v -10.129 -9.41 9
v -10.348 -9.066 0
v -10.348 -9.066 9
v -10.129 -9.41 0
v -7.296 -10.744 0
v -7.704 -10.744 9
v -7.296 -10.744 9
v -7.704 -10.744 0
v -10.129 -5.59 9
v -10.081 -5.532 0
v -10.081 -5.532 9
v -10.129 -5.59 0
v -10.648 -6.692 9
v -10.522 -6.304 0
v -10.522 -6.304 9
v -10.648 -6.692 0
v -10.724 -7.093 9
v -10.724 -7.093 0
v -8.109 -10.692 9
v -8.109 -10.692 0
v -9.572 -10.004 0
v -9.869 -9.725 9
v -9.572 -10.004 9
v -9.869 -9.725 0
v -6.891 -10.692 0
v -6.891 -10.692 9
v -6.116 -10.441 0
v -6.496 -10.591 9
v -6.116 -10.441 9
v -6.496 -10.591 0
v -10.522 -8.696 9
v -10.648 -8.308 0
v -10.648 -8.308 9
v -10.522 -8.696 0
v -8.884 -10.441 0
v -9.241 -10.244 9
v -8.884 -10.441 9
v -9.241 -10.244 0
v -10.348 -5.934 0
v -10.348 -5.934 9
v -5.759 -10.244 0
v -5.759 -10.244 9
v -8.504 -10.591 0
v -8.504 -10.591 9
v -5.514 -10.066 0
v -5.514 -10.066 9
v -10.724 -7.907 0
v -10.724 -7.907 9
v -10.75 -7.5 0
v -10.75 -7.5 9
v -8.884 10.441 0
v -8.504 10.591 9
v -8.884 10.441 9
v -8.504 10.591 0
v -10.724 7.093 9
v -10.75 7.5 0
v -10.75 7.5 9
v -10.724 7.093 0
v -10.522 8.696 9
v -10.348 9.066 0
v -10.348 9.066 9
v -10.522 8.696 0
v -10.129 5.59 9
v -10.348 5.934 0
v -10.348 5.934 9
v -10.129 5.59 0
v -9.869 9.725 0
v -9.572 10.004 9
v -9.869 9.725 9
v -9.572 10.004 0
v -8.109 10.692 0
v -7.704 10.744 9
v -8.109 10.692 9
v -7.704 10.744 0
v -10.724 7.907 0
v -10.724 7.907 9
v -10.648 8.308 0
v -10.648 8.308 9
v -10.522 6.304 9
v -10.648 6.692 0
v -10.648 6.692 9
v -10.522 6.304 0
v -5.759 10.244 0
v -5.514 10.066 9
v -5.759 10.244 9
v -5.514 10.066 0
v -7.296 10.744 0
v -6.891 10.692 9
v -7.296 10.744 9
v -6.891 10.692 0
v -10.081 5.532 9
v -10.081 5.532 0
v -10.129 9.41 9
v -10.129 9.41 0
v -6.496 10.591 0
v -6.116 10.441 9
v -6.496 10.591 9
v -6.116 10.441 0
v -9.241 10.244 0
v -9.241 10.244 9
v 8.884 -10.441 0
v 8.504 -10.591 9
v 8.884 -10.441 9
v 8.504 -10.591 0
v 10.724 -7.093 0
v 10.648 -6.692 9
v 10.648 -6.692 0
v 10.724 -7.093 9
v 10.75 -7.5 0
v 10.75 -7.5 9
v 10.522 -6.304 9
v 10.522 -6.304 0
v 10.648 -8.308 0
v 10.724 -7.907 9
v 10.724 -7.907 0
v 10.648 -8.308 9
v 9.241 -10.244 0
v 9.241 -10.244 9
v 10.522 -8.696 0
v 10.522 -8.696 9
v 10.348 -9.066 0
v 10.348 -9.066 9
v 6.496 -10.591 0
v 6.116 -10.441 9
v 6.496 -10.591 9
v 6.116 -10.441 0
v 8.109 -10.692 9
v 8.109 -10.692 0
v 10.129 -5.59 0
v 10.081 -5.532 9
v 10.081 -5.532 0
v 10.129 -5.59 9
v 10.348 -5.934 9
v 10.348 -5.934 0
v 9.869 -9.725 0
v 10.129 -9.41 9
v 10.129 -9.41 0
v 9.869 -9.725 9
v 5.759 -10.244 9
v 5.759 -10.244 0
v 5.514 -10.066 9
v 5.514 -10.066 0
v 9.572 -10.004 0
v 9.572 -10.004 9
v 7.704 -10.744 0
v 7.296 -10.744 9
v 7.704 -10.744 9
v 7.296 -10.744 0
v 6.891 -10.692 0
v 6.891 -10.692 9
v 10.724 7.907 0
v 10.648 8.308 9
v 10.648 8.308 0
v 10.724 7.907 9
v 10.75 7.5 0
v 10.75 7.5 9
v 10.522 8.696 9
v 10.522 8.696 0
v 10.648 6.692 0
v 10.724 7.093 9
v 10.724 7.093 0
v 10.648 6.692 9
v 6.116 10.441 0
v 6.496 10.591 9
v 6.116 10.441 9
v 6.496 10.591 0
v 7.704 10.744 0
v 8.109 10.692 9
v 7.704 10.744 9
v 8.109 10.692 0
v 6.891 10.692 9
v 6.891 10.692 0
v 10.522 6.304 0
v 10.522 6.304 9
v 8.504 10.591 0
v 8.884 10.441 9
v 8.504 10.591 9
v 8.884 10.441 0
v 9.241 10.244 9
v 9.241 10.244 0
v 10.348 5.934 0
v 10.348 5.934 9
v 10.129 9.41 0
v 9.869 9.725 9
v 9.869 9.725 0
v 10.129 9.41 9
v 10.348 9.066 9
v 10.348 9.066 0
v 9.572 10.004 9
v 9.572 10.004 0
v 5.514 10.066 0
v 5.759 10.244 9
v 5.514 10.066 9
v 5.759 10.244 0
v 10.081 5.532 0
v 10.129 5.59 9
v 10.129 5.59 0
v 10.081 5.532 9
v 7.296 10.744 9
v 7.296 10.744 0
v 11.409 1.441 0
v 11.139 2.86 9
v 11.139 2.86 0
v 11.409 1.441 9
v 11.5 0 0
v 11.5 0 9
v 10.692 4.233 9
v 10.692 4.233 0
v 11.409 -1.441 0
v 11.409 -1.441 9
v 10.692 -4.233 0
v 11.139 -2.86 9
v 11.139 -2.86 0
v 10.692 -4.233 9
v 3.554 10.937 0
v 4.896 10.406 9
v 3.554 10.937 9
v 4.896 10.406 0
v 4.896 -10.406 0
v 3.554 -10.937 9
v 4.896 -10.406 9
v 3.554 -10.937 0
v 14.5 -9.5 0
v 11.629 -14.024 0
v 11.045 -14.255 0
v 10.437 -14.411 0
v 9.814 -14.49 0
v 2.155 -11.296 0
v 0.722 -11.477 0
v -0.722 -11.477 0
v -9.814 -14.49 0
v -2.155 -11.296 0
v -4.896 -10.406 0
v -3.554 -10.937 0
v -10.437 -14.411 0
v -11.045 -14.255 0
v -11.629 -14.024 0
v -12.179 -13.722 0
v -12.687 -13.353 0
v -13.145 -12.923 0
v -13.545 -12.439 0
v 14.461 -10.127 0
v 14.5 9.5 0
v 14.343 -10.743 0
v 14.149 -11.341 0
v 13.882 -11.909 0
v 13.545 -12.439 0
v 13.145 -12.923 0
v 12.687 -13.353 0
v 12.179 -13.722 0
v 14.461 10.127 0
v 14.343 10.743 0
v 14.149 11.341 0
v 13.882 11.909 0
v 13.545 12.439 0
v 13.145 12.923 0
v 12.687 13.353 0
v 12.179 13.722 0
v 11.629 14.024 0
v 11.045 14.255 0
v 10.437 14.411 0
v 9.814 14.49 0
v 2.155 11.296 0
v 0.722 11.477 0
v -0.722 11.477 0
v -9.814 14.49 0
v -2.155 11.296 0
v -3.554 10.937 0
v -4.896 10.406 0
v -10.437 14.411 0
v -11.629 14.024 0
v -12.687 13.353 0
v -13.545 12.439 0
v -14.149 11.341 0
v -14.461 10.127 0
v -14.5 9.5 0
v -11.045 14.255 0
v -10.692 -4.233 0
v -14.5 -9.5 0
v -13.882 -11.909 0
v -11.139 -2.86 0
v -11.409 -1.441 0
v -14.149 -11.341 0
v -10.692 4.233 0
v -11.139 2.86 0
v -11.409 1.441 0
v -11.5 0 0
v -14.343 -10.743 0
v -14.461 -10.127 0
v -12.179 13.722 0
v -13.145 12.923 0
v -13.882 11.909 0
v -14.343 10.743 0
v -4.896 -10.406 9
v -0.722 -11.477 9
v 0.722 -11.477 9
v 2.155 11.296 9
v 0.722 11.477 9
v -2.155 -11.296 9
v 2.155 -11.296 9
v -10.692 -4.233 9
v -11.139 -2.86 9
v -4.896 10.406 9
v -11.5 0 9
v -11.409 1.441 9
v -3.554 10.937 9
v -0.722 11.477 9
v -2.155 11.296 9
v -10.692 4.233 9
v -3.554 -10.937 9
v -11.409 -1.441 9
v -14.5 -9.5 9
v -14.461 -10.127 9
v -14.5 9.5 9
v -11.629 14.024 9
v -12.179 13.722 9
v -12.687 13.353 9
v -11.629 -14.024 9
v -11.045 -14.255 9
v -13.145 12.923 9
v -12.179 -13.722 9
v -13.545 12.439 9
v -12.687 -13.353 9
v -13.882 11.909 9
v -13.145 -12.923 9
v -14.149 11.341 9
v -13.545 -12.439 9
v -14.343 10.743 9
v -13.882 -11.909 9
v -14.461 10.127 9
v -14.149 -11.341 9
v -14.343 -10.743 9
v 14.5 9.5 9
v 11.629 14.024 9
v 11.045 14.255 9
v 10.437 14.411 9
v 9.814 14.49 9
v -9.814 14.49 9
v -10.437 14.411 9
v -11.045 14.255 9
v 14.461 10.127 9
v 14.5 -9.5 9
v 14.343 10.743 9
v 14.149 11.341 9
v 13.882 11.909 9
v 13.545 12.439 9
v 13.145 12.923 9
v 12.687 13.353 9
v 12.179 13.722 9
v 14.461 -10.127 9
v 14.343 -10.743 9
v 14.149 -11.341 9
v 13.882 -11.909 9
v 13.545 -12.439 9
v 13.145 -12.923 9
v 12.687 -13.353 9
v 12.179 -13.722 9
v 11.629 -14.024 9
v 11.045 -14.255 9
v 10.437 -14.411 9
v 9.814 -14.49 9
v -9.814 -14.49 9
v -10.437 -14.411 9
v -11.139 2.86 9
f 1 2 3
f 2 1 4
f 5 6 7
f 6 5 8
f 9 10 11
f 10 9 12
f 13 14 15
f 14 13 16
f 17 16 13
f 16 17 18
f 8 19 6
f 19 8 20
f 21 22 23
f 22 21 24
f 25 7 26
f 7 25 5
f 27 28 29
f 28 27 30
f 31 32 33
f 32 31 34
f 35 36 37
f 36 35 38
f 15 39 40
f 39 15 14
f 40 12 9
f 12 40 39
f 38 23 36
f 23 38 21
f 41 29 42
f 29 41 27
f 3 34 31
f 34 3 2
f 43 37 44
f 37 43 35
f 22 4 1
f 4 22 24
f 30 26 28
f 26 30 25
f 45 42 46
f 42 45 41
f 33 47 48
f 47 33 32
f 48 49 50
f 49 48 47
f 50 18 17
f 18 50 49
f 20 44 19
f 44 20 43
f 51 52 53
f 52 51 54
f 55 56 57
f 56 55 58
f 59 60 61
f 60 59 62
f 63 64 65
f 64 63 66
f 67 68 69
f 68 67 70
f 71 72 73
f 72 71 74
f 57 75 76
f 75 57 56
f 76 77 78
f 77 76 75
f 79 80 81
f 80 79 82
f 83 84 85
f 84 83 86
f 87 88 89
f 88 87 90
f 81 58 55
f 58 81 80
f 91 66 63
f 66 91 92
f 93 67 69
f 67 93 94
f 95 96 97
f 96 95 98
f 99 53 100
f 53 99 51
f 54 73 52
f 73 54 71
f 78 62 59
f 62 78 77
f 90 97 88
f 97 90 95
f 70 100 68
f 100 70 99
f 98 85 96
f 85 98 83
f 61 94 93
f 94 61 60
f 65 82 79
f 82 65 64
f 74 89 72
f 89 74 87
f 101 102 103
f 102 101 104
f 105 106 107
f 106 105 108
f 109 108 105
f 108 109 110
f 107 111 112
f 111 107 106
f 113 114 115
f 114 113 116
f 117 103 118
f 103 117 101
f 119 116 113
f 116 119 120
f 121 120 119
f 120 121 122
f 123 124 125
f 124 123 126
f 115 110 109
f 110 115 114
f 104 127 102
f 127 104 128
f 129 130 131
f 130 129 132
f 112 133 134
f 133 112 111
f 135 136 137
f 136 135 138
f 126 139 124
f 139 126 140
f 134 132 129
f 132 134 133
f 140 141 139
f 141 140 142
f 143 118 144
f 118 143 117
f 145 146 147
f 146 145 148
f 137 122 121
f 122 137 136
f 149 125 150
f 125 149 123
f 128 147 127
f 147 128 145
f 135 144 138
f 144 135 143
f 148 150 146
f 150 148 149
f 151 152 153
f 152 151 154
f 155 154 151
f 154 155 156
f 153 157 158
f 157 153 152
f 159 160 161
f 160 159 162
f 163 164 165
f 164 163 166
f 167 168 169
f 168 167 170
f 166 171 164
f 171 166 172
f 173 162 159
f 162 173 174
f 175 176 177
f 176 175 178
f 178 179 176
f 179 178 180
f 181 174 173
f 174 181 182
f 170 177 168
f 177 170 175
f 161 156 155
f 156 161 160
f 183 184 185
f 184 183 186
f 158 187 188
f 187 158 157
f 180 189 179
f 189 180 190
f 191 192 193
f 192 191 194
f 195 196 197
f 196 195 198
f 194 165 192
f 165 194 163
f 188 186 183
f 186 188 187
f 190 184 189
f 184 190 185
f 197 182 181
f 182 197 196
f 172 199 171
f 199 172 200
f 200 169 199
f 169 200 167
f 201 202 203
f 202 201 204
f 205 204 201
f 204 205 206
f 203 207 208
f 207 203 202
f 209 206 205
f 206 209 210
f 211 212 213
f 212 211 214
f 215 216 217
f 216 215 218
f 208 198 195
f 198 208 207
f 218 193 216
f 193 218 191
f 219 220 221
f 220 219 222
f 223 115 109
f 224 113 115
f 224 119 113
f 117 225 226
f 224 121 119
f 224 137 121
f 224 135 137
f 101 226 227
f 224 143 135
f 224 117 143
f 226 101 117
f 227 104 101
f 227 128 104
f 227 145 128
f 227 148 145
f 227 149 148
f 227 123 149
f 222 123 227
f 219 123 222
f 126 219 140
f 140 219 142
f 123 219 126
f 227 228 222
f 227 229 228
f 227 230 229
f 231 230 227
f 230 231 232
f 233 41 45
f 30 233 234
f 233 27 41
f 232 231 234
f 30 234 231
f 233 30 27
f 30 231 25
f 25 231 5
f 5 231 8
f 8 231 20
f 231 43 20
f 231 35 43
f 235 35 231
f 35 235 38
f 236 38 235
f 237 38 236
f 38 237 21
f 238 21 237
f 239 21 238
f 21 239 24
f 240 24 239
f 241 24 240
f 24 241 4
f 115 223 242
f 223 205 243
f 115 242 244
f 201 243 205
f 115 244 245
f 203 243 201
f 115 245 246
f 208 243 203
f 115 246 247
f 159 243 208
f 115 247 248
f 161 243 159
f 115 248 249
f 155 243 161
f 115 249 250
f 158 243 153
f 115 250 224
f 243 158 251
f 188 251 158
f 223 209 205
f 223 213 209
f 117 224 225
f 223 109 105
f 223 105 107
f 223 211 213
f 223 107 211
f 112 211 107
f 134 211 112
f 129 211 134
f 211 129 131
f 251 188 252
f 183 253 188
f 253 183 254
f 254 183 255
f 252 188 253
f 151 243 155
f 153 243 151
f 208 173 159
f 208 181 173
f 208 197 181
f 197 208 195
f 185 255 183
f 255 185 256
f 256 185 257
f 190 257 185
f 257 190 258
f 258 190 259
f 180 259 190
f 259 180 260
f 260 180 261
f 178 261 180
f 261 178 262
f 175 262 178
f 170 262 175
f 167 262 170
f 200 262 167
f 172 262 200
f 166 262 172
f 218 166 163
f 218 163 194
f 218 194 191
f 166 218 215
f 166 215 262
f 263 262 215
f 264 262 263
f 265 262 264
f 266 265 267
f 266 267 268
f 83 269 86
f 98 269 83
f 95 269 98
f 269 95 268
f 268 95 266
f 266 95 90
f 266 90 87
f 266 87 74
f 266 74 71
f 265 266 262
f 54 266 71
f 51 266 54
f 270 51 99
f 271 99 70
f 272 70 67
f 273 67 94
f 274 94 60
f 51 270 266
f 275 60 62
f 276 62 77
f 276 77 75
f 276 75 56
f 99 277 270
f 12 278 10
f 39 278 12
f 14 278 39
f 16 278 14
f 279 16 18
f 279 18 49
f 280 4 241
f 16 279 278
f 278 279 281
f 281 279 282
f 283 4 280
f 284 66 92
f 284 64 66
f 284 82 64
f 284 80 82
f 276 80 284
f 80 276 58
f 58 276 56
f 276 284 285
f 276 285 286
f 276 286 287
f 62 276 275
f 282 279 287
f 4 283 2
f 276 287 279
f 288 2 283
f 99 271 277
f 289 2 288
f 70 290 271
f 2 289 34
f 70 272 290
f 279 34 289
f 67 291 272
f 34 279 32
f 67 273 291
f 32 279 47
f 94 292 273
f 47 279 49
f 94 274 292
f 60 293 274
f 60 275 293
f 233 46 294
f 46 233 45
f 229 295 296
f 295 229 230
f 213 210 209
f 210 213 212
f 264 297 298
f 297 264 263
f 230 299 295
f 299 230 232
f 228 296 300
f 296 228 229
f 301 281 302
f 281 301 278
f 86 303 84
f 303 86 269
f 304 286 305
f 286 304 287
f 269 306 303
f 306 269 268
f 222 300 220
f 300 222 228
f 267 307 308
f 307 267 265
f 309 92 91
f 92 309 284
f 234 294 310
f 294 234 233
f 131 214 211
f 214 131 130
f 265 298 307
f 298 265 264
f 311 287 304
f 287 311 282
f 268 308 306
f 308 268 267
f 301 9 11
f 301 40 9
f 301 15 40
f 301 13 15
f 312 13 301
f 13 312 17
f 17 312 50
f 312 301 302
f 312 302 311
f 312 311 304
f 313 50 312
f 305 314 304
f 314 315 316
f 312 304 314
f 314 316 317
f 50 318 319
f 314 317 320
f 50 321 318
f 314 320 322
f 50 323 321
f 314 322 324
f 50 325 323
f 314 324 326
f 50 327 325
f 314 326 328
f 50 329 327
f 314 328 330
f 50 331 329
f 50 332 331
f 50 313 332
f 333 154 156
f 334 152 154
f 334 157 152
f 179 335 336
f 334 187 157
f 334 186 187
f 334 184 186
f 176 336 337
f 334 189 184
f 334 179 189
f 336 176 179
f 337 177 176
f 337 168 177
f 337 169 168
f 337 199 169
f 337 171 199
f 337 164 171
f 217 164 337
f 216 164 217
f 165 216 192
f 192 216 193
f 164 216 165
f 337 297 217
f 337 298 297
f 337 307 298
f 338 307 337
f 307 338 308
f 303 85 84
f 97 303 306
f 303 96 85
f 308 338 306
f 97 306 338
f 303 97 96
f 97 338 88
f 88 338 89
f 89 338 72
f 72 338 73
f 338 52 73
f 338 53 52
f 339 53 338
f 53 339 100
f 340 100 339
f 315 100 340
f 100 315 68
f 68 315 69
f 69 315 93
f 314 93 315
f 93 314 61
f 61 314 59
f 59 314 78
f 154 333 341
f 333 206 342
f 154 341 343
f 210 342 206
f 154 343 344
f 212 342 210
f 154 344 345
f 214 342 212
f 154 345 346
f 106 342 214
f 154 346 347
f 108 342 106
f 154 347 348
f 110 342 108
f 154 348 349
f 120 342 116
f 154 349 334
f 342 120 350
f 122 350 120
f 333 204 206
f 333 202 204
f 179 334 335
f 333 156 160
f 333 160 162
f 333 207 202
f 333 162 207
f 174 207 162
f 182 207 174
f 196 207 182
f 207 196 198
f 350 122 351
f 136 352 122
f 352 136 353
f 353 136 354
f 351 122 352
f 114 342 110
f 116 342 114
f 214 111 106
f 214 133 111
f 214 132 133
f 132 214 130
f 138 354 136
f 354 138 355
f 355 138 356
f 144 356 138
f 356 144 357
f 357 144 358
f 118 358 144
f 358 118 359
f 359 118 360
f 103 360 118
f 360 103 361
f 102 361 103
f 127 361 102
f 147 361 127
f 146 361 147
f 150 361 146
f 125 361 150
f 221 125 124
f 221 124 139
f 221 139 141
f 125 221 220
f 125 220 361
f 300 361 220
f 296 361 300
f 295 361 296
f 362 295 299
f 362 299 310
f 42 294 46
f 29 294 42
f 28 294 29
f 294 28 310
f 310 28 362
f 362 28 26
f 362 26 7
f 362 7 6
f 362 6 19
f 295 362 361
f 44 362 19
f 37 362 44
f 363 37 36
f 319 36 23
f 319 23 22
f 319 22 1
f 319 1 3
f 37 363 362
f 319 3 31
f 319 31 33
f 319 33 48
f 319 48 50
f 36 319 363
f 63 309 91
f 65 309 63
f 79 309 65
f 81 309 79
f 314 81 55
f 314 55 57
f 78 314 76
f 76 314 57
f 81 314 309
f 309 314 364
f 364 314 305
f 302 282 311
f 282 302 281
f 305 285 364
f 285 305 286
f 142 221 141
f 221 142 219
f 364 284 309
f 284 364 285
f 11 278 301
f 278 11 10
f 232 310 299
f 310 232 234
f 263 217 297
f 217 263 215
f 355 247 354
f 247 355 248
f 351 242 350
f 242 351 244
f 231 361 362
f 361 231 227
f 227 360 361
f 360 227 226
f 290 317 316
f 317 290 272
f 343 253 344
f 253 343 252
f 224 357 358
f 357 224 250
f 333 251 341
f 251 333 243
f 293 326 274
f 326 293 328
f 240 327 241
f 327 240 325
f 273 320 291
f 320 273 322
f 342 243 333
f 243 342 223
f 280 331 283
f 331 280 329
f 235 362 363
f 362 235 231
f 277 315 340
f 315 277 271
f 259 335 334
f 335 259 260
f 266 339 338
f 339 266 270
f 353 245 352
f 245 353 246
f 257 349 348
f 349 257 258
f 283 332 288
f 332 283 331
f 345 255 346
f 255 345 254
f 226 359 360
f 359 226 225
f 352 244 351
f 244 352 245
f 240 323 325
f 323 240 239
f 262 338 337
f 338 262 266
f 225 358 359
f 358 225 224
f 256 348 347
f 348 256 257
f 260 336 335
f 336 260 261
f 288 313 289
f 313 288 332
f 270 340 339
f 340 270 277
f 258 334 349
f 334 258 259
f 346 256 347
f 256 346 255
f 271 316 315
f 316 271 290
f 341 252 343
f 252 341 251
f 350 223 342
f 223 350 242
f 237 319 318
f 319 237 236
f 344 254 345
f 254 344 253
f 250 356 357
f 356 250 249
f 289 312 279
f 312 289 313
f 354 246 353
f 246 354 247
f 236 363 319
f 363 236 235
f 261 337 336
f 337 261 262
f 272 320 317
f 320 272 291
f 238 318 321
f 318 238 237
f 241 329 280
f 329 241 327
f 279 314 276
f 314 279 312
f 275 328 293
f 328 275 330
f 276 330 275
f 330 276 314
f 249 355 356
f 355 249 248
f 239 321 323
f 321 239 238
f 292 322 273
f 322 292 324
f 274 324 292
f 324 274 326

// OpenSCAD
$fn = 50;


difference() {
	union() {
		hull() {
			translate(v = [-9.5000000000, 9.5000000000, 0]) {
				cylinder(h = 9, r = 5);
			}
			translate(v = [9.5000000000, 9.5000000000, 0]) {
				cylinder(h = 9, r = 5);
			}
			translate(v = [-9.5000000000, -9.5000000000, 0]) {
				cylinder(h = 9, r = 5);
			}
			translate(v = [9.5000000000, -9.5000000000, 0]) {
				cylinder(h = 9, r = 5);
			}
		}
	}
	union() {
		#translate(v = [-7.5000000000, -7.5000000000, -100.0000000000]) {
			cylinder(h = 200, r = 3.2500000000);
		}
		#translate(v = [-7.5000000000, 7.5000000000, -100.0000000000]) {
			cylinder(h = 200, r = 3.2500000000);
		}
		#translate(v = [7.5000000000, -7.5000000000, -100.0000000000]) {
			cylinder(h = 200, r = 3.2500000000);
		}
		#translate(v = [7.5000000000, 7.5000000000, -100.0000000000]) {
			cylinder(h = 200, r = 3.2500000000);
		}
		#cylinder(h = 9, r = 11.5000000000);
	}
}
